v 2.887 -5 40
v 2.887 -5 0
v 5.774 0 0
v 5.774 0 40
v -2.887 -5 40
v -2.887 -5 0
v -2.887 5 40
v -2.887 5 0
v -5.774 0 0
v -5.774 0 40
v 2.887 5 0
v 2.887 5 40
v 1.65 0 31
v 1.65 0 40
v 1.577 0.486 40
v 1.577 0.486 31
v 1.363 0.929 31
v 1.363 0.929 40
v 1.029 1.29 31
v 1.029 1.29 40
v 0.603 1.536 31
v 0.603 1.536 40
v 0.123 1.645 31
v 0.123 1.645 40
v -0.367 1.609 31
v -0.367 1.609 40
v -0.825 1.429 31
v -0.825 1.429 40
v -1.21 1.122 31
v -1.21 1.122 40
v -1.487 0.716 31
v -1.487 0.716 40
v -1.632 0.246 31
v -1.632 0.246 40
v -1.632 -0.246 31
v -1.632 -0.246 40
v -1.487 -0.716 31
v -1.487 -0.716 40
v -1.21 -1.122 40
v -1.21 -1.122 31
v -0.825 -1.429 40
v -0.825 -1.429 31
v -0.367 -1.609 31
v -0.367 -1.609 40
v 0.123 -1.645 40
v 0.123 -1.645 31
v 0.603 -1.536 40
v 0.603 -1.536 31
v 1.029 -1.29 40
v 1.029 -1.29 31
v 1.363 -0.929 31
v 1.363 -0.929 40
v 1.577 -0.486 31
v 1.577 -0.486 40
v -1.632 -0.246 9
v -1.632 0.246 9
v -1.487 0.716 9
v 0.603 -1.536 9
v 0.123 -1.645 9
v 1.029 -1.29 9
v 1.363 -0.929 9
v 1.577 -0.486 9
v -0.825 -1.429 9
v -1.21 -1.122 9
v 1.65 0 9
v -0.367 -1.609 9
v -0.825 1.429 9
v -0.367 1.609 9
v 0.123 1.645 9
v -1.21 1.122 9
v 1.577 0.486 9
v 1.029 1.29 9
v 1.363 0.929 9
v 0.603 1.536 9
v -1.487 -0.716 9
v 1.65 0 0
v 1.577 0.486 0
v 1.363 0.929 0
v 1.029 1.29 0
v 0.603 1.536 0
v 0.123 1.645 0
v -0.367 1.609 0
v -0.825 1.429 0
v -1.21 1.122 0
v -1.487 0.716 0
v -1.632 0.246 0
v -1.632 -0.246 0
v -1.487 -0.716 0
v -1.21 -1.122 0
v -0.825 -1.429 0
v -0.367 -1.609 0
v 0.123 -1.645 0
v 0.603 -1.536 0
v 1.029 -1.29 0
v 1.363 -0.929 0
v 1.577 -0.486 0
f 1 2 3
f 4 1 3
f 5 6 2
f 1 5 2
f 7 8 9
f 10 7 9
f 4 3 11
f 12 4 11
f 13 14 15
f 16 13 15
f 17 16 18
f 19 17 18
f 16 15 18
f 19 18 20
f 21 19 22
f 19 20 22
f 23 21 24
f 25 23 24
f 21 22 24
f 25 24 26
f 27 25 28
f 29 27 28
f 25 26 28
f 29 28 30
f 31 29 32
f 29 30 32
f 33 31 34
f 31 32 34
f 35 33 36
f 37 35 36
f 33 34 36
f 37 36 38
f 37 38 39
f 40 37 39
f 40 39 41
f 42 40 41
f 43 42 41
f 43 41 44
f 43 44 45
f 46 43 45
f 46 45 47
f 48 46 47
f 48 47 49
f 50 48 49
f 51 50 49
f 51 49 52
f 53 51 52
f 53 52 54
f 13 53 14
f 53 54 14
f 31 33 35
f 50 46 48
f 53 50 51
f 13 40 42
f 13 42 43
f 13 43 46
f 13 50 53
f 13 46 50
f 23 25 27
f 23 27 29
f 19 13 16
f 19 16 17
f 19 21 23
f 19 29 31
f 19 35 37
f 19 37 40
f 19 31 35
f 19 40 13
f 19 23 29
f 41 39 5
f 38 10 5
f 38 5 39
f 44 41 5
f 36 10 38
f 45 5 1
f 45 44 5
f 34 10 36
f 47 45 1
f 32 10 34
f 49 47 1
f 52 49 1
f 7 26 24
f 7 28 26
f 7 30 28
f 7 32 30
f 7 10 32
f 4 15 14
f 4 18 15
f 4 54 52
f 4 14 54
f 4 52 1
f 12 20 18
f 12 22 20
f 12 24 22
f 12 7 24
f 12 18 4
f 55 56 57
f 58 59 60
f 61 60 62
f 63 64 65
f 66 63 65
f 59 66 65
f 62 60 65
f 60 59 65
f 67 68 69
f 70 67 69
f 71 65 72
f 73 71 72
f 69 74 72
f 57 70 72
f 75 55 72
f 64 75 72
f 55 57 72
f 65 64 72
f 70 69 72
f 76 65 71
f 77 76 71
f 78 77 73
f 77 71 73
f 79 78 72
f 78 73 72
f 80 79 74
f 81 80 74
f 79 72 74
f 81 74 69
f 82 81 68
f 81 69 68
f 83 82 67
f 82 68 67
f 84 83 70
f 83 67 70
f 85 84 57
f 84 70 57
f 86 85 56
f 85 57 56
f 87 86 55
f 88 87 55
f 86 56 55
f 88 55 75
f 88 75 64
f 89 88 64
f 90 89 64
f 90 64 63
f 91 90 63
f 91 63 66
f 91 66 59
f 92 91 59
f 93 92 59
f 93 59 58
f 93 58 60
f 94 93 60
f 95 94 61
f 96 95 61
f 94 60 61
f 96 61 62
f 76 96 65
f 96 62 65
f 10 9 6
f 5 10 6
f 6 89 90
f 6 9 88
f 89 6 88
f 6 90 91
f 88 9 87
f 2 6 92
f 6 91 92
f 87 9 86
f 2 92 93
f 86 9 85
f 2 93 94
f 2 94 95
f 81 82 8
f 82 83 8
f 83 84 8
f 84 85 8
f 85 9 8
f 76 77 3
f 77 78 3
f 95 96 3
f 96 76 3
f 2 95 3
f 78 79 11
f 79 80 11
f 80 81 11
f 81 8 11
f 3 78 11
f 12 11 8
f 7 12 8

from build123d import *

# Parameters (mm, degrees)
BOSS_EXTRU_1_DEPTH      = 40
ESQUISSE2_R             = 1.65
ENL_V_MAT_EXTRU_1_DEPTH = 9
ENL_V_START             = -31
ESQUISSE2_2_R           = 1.65
ENL_V_MAT_EXTRU_2_DEPTH = 9


with BuildPart() as part:
    # Esquisse1 → Boss.-Extru.1 (new body)
    with BuildSketch(Plane.XY):
        Polygon((5.773502692, 0), (2.886751346, 5), (-2.886751346, 5), (-5.773502692, 0), (-2.886751346, -5), (2.886751346, -5), align=None)
    extrude(amount=BOSS_EXTRU_1_DEPTH)

    # Esquisse2 → Enlèv. mat.-Extru.1 (cut)
    with BuildSketch(Plane.XY.offset(40)):
        Circle(ESQUISSE2_R)
    extrude(amount=-ENL_V_MAT_EXTRU_1_DEPTH, mode=Mode.SUBTRACT)

    # Esquisse2<2> → Enlèv. mat.-Extru.2 (cut)
    with BuildSketch(Plane.XY.offset(40).offset(ENL_V_START)):
        Circle(ESQUISSE2_2_R)
    extrude(amount=-ENL_V_MAT_EXTRU_2_DEPTH, mode=Mode.SUBTRACT)


solid = part.part
